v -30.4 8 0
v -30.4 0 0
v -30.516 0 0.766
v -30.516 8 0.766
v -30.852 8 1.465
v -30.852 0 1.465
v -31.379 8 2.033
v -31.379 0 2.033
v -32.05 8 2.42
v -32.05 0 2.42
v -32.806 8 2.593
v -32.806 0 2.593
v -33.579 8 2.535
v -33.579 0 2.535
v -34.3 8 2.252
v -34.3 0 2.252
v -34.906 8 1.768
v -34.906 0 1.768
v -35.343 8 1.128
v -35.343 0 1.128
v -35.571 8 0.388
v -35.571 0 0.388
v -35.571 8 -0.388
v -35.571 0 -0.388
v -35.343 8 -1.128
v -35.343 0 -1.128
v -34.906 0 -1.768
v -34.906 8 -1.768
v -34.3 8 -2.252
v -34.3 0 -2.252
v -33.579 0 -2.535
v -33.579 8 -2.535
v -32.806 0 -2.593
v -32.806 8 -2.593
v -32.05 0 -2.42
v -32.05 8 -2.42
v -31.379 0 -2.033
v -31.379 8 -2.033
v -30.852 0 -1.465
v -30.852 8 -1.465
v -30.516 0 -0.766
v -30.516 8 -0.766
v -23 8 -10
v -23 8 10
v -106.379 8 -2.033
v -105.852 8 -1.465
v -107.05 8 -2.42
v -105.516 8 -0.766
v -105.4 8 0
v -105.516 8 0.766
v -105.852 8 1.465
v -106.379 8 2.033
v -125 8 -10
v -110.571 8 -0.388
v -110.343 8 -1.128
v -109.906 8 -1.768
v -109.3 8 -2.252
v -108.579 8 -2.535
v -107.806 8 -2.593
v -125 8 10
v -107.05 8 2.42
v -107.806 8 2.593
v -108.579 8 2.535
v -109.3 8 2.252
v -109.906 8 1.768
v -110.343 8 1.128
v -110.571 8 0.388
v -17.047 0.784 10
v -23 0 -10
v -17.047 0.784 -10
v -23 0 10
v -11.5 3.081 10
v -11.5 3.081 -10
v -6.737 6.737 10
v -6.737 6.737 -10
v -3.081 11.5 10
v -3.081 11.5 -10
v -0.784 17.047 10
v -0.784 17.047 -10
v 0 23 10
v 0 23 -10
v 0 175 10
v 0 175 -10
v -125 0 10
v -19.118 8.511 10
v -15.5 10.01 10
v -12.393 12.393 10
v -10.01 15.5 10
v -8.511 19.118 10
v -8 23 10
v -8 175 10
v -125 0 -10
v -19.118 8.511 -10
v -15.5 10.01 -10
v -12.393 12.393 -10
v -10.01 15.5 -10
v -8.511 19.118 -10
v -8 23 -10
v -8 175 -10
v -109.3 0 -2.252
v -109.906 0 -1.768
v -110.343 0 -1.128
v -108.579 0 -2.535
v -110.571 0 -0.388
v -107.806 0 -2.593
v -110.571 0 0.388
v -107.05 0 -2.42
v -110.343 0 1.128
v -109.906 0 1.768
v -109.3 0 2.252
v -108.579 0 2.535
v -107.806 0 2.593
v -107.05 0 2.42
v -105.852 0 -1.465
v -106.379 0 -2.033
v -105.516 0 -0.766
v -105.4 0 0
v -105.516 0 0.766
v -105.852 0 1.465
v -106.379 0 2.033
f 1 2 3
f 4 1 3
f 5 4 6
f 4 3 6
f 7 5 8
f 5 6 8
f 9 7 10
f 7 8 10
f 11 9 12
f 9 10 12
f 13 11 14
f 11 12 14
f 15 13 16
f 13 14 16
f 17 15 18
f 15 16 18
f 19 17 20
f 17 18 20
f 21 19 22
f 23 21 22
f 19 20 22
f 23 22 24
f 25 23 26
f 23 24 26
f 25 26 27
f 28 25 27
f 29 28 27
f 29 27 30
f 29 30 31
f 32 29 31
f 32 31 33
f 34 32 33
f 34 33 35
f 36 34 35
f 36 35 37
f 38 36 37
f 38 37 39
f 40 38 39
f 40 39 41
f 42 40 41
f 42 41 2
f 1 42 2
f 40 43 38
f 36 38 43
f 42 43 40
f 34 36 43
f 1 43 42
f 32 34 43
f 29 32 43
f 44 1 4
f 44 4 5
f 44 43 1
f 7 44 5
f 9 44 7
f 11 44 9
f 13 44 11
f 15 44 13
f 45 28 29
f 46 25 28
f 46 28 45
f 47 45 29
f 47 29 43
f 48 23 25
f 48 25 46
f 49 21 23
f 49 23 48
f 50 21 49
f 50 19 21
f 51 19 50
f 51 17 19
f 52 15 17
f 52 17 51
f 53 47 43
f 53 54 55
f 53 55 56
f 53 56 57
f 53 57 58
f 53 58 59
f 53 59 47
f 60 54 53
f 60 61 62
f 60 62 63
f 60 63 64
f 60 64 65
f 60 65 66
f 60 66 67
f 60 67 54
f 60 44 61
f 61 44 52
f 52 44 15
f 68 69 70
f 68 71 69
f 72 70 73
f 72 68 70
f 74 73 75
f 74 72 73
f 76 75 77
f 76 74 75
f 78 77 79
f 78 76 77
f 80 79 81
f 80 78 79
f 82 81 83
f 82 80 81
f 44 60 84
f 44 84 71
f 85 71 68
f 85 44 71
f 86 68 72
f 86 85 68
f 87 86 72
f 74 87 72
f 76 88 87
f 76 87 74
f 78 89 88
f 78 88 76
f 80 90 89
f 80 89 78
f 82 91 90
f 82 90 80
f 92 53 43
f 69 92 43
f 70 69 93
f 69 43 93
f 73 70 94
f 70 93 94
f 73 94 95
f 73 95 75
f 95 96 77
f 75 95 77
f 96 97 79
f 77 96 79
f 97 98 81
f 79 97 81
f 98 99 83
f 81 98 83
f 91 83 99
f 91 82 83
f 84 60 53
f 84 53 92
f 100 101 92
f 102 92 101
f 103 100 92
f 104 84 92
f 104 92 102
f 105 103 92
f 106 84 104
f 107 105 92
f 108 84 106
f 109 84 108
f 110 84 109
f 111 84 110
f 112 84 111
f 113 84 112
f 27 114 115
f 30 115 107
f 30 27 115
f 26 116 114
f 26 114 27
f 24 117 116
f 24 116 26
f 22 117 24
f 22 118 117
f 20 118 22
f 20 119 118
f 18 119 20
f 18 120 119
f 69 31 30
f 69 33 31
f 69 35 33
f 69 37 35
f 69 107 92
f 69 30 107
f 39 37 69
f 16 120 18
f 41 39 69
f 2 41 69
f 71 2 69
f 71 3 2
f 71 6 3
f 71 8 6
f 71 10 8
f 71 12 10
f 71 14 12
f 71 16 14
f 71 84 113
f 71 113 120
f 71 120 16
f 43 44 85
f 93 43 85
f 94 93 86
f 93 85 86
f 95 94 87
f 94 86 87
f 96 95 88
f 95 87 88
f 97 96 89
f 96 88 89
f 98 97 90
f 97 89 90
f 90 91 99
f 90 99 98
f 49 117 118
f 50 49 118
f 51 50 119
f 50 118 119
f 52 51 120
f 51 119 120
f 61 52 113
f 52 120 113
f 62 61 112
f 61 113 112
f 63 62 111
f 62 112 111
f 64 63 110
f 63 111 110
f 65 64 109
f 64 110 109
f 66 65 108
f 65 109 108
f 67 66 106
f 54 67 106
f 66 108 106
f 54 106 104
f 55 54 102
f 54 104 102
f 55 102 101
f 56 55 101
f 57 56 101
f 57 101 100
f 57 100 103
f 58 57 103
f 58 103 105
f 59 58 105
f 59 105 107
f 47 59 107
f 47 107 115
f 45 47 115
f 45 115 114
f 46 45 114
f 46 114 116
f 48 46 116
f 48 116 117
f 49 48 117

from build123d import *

# Parameters (mm, degrees)
PAD_DEPTH    = 10
SKETCH001_R  = 2.6
POCKET_DEPTH = 175.001


with BuildPart() as part:
    # Sketch → Pad (new body, symmetric)
    with BuildSketch(Plane.XY):
        with BuildLine():
            Line((0, 175), (-8, 175))
            Line((-8, 175), (-8, 23))
            ThreePointArc((-23, 8), (-12.393398, 12.393398), (-8, 23))
            Line((-23, 8), (-125, 8))
            Line((-125, 8), (-125, 0))
            Line((-125, 0), (-23, 0))
            ThreePointArc((-23, 0), (-6.736544, 6.736544), (0, 23))
            Line((0, 23), (0, 175))
        make_face()
    extrude(amount=PAD_DEPTH, both=True)

    # Sketch001 → Pocket (cut, through all)
    with BuildSketch(Plane.XZ):
        with Locations((-108, 0)):
            Circle(SKETCH001_R)
        with Locations((-33, 0)):
            Circle(SKETCH001_R)
    extrude(amount=-POCKET_DEPTH, mode=Mode.SUBTRACT)


solid = part.part
